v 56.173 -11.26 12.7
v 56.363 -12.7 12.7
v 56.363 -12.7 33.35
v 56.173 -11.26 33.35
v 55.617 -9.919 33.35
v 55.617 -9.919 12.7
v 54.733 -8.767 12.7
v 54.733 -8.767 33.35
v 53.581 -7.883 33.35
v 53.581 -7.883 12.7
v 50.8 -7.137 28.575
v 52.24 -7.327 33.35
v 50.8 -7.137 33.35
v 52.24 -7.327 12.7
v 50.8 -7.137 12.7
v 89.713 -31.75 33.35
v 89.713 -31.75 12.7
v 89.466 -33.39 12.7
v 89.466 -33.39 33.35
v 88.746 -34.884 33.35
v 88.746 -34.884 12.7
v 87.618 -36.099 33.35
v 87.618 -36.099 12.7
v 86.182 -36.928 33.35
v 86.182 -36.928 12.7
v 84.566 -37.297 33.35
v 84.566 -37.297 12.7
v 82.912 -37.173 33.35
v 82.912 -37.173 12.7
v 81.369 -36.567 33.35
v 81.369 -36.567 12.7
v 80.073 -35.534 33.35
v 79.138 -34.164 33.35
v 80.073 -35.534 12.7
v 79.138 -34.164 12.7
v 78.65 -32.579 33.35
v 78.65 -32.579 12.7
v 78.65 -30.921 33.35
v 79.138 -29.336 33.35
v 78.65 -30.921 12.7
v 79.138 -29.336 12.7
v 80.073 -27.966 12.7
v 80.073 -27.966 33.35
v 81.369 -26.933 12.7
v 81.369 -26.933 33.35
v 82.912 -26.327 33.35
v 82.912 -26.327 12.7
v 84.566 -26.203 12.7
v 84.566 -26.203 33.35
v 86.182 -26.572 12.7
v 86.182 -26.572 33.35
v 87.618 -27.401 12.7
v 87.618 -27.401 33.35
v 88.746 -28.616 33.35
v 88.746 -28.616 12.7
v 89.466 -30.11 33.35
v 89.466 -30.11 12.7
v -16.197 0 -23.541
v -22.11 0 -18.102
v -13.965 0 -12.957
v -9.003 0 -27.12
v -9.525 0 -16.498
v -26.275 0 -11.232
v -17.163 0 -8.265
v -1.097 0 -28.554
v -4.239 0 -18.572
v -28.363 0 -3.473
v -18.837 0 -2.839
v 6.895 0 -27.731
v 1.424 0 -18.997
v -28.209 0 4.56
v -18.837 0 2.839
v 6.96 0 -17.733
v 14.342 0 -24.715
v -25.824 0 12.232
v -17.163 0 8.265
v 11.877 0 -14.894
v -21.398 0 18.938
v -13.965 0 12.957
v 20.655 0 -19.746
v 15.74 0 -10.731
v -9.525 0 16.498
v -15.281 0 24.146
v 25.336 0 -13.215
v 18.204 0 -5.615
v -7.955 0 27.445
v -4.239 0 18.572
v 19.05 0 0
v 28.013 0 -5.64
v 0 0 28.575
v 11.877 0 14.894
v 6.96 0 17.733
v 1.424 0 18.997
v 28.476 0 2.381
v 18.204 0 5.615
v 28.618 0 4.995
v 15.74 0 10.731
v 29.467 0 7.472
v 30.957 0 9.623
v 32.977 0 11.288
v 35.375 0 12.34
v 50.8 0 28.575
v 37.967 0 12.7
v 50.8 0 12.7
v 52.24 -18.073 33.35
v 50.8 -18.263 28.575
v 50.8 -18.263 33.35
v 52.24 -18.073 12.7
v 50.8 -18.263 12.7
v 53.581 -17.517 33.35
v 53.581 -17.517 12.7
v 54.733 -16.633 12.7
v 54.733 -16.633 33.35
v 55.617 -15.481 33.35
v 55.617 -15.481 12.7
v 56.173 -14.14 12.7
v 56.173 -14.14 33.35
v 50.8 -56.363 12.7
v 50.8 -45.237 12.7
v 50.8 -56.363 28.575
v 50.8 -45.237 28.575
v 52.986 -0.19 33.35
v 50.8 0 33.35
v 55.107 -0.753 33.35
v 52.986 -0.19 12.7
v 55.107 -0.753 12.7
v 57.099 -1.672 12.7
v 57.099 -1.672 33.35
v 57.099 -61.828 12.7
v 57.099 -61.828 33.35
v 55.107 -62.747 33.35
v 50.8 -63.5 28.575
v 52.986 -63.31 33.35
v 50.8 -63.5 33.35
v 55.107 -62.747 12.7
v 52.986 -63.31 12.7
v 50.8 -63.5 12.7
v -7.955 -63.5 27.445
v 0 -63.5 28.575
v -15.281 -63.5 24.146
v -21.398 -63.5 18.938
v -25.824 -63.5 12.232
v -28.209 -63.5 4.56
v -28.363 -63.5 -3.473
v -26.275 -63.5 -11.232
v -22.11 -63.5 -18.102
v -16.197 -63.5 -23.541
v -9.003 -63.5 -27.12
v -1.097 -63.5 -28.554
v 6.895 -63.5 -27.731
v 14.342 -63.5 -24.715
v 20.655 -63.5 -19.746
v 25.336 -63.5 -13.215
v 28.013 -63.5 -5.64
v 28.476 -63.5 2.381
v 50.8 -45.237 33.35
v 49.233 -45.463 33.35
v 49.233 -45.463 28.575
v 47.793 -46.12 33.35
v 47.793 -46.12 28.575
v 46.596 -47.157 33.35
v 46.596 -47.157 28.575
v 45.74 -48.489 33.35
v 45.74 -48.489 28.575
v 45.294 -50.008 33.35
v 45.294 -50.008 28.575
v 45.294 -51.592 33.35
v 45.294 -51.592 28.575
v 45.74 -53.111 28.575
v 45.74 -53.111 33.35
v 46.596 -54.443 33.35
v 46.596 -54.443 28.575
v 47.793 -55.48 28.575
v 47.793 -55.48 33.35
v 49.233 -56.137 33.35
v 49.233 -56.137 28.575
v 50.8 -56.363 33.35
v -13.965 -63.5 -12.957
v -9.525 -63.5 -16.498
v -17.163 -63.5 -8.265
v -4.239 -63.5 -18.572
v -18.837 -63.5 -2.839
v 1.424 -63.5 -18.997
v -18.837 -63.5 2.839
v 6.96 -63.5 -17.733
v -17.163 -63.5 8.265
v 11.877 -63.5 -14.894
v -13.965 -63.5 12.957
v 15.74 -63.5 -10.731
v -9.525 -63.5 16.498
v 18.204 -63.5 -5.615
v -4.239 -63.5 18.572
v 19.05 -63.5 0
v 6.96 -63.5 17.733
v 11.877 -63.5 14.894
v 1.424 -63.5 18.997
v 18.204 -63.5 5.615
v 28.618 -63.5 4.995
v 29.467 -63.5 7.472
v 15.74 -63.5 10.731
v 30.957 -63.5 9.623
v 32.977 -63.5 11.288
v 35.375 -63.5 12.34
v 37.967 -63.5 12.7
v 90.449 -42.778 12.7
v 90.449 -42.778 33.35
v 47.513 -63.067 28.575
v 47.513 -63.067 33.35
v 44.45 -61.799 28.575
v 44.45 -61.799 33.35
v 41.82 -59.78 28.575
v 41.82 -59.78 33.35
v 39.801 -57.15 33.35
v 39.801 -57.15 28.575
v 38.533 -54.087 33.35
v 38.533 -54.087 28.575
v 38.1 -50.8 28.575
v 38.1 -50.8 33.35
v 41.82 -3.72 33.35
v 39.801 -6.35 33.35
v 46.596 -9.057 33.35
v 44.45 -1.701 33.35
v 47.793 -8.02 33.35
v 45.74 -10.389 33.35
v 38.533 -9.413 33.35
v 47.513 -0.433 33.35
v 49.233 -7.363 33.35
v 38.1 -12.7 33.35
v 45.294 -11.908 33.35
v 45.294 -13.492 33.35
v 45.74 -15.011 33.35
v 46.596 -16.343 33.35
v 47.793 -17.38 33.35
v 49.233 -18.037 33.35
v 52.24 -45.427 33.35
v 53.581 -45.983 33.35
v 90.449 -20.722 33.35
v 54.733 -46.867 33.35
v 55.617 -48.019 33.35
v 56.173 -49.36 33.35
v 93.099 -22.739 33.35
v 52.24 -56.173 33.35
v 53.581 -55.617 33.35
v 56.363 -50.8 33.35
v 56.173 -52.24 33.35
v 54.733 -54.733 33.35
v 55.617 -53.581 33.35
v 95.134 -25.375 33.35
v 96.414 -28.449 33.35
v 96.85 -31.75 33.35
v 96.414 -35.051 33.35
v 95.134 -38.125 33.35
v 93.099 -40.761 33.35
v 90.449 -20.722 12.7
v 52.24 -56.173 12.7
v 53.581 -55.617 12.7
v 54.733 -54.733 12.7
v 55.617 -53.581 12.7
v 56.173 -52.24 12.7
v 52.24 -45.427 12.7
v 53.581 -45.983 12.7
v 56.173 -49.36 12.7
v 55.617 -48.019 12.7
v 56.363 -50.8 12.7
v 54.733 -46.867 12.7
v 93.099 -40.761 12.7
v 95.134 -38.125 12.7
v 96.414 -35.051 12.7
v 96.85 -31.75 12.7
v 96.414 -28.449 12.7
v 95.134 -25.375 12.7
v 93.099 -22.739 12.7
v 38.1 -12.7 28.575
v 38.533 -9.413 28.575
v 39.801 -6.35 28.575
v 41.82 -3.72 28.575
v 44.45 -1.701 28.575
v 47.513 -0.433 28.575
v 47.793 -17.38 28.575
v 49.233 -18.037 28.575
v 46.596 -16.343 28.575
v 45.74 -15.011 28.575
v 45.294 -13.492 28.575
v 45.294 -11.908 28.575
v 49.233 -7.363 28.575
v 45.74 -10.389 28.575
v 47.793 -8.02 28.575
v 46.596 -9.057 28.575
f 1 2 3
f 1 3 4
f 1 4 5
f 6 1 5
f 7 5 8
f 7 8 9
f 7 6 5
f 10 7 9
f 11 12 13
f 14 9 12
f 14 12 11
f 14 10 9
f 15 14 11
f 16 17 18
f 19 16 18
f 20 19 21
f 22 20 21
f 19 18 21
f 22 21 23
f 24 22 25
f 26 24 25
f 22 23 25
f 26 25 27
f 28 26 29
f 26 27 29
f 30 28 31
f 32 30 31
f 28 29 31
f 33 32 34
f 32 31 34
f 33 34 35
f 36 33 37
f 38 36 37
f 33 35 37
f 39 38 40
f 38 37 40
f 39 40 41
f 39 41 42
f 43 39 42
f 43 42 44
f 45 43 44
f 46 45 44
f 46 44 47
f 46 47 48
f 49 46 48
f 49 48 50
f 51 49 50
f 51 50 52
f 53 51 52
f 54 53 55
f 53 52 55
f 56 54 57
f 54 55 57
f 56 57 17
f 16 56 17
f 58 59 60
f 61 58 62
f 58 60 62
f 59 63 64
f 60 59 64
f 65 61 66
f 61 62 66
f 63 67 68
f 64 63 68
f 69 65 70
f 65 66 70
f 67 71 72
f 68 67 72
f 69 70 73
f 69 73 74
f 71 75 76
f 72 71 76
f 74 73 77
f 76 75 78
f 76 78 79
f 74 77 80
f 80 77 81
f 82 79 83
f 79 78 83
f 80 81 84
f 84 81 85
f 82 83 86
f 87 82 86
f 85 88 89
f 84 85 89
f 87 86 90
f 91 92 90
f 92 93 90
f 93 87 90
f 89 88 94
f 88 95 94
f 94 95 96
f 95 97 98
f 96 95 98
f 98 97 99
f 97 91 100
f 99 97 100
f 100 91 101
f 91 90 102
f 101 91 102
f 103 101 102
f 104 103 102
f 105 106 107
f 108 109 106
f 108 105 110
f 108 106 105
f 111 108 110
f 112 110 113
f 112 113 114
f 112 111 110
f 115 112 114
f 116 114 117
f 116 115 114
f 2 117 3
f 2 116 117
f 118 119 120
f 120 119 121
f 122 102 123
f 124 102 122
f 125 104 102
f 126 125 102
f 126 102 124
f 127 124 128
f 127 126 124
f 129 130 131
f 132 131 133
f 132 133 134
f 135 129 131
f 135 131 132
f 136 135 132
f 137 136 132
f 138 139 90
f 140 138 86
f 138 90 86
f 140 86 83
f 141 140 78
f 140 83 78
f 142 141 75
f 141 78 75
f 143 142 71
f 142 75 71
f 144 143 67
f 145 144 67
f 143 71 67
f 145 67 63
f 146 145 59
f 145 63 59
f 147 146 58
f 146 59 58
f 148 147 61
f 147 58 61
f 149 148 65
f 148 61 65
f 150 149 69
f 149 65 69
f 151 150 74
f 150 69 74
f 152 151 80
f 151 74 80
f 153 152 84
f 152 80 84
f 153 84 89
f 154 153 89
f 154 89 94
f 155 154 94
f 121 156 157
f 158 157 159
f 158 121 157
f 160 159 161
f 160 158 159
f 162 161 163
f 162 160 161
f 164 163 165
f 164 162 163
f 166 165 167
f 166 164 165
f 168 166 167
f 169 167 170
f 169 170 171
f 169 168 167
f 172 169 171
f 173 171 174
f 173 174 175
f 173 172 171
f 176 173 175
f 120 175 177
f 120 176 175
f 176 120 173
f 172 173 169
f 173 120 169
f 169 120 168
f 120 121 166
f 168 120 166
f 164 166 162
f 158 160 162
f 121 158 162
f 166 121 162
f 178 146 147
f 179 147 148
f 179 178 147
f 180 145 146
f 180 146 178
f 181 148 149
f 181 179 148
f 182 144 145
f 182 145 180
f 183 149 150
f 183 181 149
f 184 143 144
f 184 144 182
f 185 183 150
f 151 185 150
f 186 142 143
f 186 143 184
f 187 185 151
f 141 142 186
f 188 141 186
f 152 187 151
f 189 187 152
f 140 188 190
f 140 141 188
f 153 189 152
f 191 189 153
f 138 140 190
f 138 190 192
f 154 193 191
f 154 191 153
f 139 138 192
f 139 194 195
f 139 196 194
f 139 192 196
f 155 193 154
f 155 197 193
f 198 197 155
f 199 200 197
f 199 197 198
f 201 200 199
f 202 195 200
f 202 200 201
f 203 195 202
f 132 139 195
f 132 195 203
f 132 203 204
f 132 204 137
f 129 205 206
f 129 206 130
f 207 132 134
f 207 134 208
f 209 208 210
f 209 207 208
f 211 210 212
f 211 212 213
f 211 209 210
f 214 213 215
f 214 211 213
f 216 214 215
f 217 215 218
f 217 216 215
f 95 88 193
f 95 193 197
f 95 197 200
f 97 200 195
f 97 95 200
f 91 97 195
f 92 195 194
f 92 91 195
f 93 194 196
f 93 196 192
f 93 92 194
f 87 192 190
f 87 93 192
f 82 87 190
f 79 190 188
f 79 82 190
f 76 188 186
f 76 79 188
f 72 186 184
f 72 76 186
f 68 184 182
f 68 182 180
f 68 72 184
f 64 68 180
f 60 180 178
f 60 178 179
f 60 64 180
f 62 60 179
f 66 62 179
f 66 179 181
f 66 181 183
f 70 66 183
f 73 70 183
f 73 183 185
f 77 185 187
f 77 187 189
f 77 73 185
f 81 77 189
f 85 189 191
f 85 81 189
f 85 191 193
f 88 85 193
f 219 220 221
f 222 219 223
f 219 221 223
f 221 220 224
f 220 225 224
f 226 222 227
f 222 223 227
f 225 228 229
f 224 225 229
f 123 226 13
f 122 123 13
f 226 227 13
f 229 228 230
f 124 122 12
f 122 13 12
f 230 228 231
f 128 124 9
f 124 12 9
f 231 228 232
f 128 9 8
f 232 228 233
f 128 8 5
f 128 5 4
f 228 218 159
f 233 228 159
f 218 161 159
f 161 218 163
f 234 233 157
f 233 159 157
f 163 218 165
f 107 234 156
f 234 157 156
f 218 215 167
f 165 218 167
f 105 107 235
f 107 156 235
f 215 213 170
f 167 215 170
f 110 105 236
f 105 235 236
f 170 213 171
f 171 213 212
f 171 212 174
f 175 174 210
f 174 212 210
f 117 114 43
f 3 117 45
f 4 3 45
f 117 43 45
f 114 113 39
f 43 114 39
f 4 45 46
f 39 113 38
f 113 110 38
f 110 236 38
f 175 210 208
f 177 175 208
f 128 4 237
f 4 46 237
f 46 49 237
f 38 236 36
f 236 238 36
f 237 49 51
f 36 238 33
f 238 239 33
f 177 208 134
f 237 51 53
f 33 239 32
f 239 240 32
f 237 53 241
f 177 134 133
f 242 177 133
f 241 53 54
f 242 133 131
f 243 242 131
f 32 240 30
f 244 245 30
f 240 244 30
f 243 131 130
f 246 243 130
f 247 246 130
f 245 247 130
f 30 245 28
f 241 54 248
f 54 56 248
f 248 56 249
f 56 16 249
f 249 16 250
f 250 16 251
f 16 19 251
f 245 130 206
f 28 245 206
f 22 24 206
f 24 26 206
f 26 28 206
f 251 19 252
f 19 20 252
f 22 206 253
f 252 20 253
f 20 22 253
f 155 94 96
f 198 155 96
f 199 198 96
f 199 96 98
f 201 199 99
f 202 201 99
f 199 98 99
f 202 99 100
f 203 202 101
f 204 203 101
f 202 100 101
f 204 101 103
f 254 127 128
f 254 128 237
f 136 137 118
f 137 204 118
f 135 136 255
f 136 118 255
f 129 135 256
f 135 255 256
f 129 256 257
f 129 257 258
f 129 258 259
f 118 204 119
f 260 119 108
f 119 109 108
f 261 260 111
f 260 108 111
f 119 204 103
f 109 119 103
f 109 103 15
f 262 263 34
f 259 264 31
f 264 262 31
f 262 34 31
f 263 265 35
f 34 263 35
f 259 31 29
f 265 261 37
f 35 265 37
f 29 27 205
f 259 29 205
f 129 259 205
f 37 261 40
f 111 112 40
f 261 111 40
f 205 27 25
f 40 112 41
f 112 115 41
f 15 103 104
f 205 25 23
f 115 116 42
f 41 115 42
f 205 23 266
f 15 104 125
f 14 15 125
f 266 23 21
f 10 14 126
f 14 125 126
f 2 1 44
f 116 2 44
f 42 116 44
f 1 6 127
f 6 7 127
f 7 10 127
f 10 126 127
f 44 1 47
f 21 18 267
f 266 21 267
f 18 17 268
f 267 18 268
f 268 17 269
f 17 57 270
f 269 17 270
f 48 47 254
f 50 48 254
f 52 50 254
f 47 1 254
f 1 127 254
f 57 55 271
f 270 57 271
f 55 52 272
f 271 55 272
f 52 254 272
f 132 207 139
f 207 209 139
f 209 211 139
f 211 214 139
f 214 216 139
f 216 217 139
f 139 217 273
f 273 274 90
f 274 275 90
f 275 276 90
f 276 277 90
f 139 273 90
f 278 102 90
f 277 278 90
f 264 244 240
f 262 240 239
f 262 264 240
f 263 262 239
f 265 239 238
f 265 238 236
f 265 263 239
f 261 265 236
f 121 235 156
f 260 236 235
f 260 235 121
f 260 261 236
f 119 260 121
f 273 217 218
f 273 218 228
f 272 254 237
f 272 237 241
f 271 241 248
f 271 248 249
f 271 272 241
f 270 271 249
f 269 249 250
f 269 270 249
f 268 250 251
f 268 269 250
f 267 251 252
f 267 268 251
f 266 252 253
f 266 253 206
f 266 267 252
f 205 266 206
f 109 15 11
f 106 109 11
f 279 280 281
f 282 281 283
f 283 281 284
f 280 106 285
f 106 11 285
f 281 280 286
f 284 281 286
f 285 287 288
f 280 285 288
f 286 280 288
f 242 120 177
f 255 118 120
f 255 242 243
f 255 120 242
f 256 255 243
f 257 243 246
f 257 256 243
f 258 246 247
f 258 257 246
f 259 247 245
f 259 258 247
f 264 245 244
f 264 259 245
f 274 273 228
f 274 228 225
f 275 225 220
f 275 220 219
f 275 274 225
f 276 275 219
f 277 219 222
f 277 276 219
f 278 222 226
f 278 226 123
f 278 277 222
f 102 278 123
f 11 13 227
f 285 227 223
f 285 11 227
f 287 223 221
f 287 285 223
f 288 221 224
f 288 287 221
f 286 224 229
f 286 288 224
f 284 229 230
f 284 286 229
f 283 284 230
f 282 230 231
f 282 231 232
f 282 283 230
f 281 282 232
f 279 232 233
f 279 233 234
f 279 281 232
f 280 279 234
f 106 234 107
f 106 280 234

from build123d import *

# Parameters (mm, degrees)
F0_R     = 19.05
F1_DEPTH = 63.5
F2_R     = 5.5626
F3_DEPTH = 20.6502


with BuildPart() as f1:
    # F0 (on Front) → F1 (new body)
    with BuildSketch(Plane.XZ):
        with BuildLine():
            Line((50.8, 28.575), (0, 28.575))
            ThreePointArc((0, 28.575), (-19.345366, -21.030631), (28.475608, 2.38125))
            ThreePointArc((28.475608, 2.38125), (30.957268, 9.623455), (37.967478, 12.7))
            Line((37.967478, 12.7), (50.8, 12.7))
            Line((50.8, 12.7), (50.8, 28.575))
        make_face()
        Circle(F0_R, mode=Mode.SUBTRACT)
    extrude(amount=F1_DEPTH)

    # F2 (on face) → F3 (join)
    with BuildSketch(Plane(origin=(0, 0, 12.7), x_dir=(1, 0, 0), z_dir=(0, 0, -1))):
        with BuildLine():
            ThreePointArc((50.8, 45.2374), (45.2374, 50.8), (50.8, 56.3626))
            Line((50.8, 56.3626), (50.8, 63.5))
            ThreePointArc((50.8, 63.5), (41.819744, 59.780256), (38.1, 50.8))
            Line((38.1, 50.8), (38.1, 12.7))
            ThreePointArc((38.1, 12.7), (41.819744, 3.719744), (50.8, 0))
            Line((50.8, 0), (50.8, 7.1374))
            ThreePointArc((50.8, 7.1374), (45.2374, 12.7), (50.8, 18.2626))
            Line((50.8, 18.2626), (50.8, 45.2374))
        make_face()
        with BuildLine():
            ThreePointArc((50.8, 56.3626), (54.733352, 54.733352), (56.3626, 50.8))
            ThreePointArc((56.3626, 50.8), (54.733352, 46.866648), (50.8, 45.2374))
            Line((50.8, 45.2374), (50.8, 18.2626))
            ThreePointArc((50.8, 18.2626), (54.733352, 16.633352), (56.3626, 12.7))
            ThreePointArc((56.3626, 12.7), (54.733352, 8.766648), (50.8, 7.1374))
            Line((50.8, 7.1374), (50.8, 0))
            ThreePointArc((50.8, 0), (54.058676, 0.425187), (57.099155, 1.672279))
            Line((57.099155, 1.672279), (90.449355, 20.722279))
            ThreePointArc((90.449355, 20.722279), (96.8502, 31.75), (90.449355, 42.777721))
            Line((90.449355, 42.777721), (57.099155, 61.827721))
            ThreePointArc((57.099155, 61.827721), (54.058676, 63.074813), (50.8, 63.5))
            Line((50.8, 63.5), (50.8, 56.3626))
        make_face()
        with Locations((84.1502, 31.75)):
            Circle(F2_R, mode=Mode.SUBTRACT)
    extrude(amount=-F3_DEPTH)


solid = f1.part
